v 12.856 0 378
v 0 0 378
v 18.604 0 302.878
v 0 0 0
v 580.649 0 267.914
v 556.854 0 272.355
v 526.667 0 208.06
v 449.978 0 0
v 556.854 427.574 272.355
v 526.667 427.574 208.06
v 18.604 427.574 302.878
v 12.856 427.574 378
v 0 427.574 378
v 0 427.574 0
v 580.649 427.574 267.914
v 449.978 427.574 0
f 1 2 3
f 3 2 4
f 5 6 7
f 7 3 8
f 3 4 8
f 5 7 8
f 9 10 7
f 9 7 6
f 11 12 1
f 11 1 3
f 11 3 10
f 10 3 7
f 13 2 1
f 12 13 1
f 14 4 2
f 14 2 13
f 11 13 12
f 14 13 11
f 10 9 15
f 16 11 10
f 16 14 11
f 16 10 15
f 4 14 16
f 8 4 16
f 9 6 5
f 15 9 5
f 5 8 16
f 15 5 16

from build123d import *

# Parameters (mm, degrees)
SKETCH1_W               = 449.978341512
SKETCH1_H               = 427.573746213
BOSS_EXTRUDE1_DEPTH     = 378
DRAFT2_ANGLE            = 26
CUT_EXTRUDE1_DEPTH      = 854.283154982
CUT_EXTRUDE1_DEPTH_BACK = 854.283154982


with BuildPart() as part:
    # Sketch1 → Boss-Extrude1 (new body)
    with BuildSketch(Plane.XY):
        with Locations((224.989170756, 213.786873107)):
            Rectangle(SKETCH1_W, SKETCH1_H)
    extrude(amount=BOSS_EXTRUDE1_DEPTH)

    # Draft2
    draft2_faces = [part.faces().sort_by_distance(p)[0] for p in [
        (449.978341512, 213.786873106, 189),
    ]]
    draft(draft2_faces, Plane(origin=(0, 0, 0), x_dir=(-1, 0, 0), z_dir=(0, 0, -1)), DRAFT2_ANGLE)

    # Sketch2 → Cut-Extrude1 (cut, two sides: drawn at the far end of the back side and taken through both)
    with BuildSketch(Plane(origin=(0, 427.573746213, 0), x_dir=(1, 0, 0), z_dir=(0, 1, 0)).offset(-CUT_EXTRUDE1_DEPTH_BACK)):
        Polygon((-98.889763821, -1838.554406759), (12.856362316, -378), (18.603916927, -302.877787654), (526.667256984, -208.060368048), (556.854417648, -272.355099853), (580.648945558, -267.914441457), (2020.610369742, 0.818639262), (3940.798807951, -2211.804656514), (1821.298674388, -4051.177702535), align=None)
    extrude(amount=CUT_EXTRUDE1_DEPTH + CUT_EXTRUDE1_DEPTH_BACK, mode=Mode.SUBTRACT)


solid = part.part
